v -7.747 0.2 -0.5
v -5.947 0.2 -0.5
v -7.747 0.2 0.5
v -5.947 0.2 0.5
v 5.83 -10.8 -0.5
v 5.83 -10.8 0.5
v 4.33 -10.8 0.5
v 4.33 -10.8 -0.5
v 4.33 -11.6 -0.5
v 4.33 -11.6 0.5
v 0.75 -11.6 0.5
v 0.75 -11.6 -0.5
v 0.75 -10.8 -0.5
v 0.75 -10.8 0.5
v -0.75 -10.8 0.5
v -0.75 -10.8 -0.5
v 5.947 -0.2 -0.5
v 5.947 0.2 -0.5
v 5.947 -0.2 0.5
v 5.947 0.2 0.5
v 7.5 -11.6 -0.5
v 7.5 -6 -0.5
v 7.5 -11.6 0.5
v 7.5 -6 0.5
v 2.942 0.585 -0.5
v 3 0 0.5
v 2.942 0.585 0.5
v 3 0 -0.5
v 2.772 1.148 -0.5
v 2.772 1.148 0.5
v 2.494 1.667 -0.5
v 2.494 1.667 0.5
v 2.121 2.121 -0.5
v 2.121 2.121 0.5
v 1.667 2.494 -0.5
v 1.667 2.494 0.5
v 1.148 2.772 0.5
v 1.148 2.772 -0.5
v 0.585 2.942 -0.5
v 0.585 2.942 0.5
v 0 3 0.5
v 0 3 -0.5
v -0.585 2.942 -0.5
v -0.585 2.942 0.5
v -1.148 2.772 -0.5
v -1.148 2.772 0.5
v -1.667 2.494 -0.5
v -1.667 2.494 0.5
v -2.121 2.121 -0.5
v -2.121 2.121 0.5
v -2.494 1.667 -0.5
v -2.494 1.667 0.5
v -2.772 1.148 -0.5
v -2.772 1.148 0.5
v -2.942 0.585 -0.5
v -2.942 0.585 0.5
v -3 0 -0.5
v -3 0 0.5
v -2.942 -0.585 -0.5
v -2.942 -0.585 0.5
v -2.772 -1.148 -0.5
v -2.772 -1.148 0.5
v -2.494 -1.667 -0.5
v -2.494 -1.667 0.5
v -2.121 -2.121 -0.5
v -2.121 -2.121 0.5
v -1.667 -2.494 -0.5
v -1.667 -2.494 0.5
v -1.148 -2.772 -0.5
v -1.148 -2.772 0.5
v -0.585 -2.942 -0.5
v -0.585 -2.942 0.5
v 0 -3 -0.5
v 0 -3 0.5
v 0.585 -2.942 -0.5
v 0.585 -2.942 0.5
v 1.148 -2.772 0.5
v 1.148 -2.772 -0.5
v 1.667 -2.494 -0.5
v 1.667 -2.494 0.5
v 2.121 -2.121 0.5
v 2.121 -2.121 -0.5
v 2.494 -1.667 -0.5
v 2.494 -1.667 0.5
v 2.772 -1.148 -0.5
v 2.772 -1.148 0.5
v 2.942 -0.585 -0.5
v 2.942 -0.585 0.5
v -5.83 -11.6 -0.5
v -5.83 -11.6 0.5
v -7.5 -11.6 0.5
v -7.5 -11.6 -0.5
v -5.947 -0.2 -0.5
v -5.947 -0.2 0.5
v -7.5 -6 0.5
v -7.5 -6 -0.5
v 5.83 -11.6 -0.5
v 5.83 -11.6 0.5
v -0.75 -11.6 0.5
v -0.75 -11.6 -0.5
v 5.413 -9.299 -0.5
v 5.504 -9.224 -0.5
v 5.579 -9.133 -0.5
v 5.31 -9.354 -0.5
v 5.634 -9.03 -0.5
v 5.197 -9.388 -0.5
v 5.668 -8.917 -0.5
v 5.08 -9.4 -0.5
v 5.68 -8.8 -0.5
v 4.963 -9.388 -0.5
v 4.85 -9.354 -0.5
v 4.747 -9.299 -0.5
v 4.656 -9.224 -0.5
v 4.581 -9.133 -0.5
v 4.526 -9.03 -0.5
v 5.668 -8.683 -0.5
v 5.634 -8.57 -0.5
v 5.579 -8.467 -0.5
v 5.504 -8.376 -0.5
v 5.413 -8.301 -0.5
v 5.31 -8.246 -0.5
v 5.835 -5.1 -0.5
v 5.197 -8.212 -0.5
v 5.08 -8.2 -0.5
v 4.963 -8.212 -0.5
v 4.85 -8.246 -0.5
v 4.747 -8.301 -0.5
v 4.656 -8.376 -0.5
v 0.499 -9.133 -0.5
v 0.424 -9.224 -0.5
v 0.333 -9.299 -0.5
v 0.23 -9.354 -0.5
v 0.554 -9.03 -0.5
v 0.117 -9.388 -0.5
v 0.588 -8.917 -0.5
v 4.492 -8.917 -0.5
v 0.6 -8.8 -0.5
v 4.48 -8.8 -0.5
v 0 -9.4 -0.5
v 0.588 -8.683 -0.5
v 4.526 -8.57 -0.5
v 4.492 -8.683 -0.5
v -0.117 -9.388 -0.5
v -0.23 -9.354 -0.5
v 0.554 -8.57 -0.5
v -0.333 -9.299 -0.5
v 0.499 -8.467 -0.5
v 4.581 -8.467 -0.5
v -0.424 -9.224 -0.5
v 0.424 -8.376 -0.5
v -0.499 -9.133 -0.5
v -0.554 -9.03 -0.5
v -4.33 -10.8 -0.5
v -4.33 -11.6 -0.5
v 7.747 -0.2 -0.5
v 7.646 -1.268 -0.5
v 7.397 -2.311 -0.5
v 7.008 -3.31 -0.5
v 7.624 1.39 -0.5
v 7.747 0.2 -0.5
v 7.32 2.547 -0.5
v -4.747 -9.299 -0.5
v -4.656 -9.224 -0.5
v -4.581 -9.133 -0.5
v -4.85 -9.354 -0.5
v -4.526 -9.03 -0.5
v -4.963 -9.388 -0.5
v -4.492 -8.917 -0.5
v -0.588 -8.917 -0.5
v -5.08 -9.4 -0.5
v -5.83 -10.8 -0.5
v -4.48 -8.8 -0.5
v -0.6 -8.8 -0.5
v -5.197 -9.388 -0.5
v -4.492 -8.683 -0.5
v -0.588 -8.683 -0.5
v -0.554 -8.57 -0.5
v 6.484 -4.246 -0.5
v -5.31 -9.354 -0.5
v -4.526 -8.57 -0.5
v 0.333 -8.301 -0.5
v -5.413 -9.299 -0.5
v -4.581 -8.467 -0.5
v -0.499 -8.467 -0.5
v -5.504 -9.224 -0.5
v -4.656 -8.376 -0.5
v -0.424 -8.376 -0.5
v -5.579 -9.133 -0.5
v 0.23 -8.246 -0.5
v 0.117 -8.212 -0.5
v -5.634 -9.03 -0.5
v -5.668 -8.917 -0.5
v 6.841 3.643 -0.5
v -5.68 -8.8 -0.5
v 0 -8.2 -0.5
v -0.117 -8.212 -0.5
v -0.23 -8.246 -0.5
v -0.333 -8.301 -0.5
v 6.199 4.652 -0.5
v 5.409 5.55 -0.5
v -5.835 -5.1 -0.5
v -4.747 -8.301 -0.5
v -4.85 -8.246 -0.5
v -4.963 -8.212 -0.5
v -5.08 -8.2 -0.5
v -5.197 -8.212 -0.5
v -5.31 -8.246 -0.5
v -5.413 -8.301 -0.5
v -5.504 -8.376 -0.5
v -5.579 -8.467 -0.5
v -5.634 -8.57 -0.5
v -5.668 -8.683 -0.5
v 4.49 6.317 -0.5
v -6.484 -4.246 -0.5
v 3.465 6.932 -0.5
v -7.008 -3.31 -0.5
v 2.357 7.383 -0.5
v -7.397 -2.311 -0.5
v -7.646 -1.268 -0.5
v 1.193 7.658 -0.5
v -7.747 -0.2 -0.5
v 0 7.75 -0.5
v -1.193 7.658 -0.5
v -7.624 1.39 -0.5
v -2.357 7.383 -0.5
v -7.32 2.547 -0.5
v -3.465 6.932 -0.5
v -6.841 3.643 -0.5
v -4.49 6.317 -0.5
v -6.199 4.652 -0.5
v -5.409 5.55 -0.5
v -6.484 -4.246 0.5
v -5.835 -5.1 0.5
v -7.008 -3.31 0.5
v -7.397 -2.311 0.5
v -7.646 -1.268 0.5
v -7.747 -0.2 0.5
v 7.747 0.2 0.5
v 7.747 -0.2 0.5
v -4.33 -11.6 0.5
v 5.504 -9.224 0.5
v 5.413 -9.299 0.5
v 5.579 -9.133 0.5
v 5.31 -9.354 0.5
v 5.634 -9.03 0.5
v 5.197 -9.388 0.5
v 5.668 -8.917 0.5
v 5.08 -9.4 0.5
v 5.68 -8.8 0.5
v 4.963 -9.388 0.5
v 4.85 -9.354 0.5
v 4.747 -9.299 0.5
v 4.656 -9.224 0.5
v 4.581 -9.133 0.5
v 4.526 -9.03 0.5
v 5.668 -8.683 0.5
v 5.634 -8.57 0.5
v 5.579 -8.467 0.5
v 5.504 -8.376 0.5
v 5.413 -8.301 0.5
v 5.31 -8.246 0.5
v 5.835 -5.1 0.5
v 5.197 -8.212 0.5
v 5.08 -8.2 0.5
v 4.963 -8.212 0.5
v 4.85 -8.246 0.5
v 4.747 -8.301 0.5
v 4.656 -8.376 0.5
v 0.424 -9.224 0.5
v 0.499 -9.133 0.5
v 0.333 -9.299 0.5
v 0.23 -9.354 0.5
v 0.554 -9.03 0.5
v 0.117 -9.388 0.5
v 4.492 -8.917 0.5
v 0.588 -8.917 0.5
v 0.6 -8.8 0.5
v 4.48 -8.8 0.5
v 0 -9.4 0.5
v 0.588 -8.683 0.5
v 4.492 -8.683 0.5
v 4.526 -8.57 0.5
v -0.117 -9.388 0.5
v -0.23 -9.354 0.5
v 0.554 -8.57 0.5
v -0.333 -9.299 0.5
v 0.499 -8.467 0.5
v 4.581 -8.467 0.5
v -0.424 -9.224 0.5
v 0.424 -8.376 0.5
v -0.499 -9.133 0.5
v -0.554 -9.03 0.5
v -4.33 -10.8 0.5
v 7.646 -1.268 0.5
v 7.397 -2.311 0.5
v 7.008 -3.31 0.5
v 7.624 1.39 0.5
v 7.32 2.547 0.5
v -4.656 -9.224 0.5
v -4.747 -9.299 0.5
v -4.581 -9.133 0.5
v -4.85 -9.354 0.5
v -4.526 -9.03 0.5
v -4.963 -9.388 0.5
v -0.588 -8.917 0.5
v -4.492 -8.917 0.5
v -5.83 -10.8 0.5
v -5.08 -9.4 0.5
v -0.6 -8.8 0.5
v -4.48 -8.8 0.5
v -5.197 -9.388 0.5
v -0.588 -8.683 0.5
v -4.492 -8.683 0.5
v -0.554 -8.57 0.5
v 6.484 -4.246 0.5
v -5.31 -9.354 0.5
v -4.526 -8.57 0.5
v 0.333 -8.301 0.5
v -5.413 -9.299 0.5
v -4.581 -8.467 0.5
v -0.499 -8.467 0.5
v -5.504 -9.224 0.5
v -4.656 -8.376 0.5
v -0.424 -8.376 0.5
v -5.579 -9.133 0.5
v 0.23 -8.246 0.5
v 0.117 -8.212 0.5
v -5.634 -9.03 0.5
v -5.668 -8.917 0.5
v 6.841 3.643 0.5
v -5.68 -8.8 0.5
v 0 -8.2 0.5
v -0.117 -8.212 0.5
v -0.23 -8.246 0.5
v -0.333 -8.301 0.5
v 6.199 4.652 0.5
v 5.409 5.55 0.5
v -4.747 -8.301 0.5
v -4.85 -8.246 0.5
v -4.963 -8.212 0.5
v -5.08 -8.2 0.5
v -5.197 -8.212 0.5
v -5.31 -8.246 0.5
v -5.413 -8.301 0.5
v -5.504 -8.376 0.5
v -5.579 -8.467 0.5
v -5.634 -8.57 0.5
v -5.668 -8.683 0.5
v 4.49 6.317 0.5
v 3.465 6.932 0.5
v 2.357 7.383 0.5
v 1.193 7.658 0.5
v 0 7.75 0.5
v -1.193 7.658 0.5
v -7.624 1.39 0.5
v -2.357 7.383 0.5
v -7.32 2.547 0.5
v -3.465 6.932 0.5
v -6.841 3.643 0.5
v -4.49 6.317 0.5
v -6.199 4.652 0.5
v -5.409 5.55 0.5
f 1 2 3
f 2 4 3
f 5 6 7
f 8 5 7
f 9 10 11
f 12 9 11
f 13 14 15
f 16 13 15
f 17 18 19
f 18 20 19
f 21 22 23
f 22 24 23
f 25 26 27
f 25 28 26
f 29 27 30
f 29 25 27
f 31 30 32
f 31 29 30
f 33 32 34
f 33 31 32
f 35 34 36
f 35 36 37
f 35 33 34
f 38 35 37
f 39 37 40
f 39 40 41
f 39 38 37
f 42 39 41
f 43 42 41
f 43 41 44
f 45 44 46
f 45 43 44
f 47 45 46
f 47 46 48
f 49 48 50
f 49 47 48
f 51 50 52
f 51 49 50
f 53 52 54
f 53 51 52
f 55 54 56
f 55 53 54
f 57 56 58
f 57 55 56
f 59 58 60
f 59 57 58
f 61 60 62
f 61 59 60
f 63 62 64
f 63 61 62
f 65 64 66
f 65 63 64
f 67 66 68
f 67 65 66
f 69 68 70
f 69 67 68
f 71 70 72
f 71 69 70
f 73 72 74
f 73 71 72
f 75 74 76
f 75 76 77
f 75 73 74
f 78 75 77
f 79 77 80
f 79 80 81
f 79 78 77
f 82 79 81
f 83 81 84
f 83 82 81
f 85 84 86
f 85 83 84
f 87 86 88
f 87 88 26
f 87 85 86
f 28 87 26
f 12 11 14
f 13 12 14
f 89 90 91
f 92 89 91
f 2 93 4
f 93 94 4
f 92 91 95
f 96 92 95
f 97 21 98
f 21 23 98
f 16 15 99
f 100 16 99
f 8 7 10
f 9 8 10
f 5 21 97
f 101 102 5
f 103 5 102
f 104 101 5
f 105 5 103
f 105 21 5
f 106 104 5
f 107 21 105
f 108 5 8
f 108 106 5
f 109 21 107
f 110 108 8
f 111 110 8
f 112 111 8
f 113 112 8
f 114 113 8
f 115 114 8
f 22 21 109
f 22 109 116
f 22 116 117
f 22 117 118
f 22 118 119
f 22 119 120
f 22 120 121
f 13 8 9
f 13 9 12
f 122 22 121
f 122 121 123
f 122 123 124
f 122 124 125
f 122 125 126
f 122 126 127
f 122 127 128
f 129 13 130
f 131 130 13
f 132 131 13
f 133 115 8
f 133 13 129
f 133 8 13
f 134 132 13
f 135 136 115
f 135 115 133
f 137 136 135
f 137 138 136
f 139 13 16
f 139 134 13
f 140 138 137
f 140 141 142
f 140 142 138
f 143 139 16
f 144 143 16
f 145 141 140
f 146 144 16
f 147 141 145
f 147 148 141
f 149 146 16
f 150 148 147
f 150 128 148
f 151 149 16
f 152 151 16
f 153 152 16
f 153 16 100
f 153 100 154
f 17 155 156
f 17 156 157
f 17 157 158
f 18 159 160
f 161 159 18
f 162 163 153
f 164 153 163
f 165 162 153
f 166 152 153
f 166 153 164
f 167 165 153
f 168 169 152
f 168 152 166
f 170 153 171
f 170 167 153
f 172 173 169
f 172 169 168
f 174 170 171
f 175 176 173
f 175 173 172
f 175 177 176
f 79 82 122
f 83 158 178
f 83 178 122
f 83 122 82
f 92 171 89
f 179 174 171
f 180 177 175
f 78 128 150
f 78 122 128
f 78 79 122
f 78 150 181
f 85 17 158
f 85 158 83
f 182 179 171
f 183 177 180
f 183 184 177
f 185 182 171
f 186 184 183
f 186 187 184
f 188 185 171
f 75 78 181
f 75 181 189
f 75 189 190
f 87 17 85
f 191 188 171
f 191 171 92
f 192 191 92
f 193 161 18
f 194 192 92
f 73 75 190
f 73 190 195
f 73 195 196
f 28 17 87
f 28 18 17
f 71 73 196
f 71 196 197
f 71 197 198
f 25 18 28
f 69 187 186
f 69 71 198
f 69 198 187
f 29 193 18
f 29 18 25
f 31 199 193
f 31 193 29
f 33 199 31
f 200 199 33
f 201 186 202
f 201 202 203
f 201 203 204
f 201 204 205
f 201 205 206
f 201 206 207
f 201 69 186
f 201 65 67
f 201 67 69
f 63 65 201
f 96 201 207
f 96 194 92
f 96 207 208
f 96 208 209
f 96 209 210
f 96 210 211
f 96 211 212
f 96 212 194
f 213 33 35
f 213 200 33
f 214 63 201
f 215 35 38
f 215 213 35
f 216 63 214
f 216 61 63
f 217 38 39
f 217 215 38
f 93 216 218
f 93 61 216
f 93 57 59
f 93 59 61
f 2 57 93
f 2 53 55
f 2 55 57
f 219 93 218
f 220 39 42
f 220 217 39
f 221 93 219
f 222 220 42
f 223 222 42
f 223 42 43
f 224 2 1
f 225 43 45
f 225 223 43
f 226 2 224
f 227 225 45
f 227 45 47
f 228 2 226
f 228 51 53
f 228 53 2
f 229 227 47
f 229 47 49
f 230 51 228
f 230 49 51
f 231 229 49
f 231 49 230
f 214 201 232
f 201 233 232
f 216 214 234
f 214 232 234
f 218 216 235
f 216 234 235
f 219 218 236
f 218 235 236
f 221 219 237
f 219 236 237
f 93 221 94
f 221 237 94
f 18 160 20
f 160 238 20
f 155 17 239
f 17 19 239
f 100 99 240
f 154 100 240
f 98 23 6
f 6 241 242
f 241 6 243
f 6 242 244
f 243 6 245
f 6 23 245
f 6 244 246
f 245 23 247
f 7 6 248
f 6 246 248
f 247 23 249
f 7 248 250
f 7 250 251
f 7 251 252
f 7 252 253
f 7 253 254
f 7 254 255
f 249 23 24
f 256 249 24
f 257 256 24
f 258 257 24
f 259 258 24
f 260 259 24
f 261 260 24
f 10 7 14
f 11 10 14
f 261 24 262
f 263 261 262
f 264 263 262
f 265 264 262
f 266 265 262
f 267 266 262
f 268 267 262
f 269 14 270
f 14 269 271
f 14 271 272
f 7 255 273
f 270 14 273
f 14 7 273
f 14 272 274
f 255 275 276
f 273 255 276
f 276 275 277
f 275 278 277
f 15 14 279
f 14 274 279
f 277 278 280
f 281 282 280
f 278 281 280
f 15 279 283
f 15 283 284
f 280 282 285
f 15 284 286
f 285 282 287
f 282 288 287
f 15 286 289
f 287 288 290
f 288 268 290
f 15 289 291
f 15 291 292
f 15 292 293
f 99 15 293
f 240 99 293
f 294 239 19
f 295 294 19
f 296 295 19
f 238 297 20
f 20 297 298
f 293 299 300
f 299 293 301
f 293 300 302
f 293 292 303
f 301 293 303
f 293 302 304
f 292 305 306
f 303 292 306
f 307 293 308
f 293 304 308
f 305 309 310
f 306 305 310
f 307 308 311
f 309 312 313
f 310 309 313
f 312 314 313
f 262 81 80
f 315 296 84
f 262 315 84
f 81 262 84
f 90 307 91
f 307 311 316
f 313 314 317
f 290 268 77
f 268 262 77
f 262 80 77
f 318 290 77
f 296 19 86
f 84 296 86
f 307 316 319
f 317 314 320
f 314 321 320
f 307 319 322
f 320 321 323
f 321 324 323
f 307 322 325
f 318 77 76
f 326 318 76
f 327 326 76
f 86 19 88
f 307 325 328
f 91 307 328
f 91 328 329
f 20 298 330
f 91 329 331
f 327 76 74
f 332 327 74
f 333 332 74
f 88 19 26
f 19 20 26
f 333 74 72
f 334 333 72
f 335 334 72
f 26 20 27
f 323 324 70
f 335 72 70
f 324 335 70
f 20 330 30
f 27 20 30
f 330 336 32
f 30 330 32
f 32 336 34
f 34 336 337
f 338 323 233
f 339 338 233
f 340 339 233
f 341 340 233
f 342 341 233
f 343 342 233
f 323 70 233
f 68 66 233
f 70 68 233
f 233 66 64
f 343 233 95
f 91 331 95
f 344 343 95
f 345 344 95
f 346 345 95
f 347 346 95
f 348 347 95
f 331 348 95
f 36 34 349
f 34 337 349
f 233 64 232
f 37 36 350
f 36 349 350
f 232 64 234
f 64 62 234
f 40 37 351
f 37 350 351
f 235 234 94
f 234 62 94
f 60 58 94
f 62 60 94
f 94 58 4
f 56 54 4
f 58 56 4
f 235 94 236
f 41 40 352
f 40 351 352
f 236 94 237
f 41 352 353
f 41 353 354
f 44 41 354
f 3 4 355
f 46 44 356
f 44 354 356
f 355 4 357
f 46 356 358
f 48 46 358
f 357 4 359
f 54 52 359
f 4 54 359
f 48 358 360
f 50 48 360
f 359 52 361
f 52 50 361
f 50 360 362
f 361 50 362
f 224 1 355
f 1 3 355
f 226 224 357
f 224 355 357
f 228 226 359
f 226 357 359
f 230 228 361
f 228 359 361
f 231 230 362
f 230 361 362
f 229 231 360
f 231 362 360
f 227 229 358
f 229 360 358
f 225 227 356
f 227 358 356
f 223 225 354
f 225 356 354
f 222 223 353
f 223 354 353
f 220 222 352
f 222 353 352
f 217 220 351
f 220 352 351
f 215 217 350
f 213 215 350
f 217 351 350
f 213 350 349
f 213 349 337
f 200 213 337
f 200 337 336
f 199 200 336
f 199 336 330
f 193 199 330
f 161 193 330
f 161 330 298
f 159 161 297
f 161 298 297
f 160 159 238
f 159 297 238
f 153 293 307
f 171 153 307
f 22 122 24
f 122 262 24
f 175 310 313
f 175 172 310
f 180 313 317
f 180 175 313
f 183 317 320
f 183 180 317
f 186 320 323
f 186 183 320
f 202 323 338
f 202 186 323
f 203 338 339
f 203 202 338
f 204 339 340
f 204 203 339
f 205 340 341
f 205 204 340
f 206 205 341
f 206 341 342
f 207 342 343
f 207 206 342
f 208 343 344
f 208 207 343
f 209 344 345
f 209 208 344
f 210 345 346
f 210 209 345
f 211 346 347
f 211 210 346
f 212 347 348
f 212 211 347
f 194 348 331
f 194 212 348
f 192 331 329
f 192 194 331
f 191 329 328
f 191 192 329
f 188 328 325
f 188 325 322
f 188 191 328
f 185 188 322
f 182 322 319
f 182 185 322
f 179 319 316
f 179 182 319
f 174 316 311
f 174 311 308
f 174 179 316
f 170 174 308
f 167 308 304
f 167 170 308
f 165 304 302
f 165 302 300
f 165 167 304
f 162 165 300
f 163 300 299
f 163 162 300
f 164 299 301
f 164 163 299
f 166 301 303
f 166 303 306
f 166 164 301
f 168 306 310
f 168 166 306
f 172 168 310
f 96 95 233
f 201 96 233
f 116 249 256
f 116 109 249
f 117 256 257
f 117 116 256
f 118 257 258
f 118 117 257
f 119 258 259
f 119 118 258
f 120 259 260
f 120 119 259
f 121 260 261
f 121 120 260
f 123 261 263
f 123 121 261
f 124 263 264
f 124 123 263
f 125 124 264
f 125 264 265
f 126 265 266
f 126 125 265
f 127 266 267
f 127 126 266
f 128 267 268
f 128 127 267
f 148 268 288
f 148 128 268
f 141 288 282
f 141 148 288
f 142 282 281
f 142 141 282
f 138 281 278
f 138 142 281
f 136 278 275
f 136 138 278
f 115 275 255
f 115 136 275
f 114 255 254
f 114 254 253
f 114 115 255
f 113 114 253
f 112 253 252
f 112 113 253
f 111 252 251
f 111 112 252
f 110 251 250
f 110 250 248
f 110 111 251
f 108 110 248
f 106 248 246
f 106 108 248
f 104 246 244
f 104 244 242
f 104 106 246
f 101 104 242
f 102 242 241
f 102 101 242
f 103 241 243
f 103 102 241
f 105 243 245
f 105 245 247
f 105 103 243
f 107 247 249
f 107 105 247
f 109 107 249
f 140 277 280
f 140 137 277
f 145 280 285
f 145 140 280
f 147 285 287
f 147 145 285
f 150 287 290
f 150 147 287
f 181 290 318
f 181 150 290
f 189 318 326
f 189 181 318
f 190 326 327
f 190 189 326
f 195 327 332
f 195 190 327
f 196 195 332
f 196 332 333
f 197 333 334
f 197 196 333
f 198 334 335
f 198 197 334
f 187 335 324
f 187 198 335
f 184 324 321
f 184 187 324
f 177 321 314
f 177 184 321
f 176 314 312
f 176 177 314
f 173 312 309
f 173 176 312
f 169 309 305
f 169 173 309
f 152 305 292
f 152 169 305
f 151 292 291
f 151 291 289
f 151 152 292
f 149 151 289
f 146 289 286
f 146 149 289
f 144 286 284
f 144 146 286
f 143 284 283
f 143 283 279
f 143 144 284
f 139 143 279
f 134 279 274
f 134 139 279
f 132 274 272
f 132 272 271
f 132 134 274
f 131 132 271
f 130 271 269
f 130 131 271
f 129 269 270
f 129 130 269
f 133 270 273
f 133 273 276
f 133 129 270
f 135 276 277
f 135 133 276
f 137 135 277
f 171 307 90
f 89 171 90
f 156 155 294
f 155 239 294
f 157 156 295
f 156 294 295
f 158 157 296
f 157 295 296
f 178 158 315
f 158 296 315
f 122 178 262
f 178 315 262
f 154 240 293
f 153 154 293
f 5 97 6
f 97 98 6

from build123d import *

# Parameters (mm, degrees)
SKETCH1_R           = 0.6
SKETCH1_R_2         = 3
BOSS_EXTRUDE1_DEPTH = 0.5


with BuildPart() as part:
    # Sketch1 → Boss-Extrude1 (new, symmetric)
    with BuildSketch(Plane.XY):
        with BuildLine():
            Line((-7.5, -6), (-5.835451996, -5.1))
            ThreePointArc((-5.835451996, -5.1), (-7.219840415, -2.81716247), (-7.747418925, -0.2))
            Line((-7.747418925, -0.2), (-5.947418925, -0.2))
            Line((-5.947418925, -0.2), (-5.947418925, 0))
            Line((-5.947418925, 0), (-5.947418925, 0.2))
            Line((-5.947418925, 0.2), (-7.747418925, 0.2))
            ThreePointArc((-7.747418925, 0.2), (0, 7.75), (7.747418925, 0.2))
            Line((7.747418925, 0.2), (5.947418925, 0.2))
            Line((5.947418925, 0.2), (5.947418925, 0))
            Line((5.947418925, 0), (5.947418925, -0.2))
            Line((5.947418925, -0.2), (7.747418925, -0.2))
            ThreePointArc((7.747418925, -0.2), (7.219840415, -2.81716247), (5.835451996, -5.1))
            Line((5.835451996, -5.1), (7.5, -6))
            Line((7.5, -6), (7.5, -11.6))
            Line((7.5, -11.6), (5.83, -11.6))
            Line((5.83, -11.6), (5.83, -10.8))
            Line((5.83, -10.8), (4.33, -10.8))
            Line((4.33, -10.8), (4.33, -11.6))
            Line((4.33, -11.6), (0.75, -11.6))
            Line((0.75, -11.6), (0.75, -10.8))
            Line((0.75, -10.8), (-0.75, -10.8))
            Line((-0.75, -10.8), (-0.75, -11.6))
            Line((-0.75, -11.6), (-4.33, -11.6))
            Line((-4.33, -11.6), (-4.33, -10.8))
            Line((-4.33, -10.8), (-5.83, -10.8))
            Line((-5.83, -10.8), (-5.83, -11.6))
            Line((-5.83, -11.6), (-7.5, -11.6))
            Line((-7.5, -11.6), (-7.5, -6))
        make_face()
        with Locations((-5.08, -8.8)):
            Circle(SKETCH1_R, mode=Mode.SUBTRACT)
        with Locations((0, -8.8)):
            Circle(SKETCH1_R, mode=Mode.SUBTRACT)
        with Locations((5.08, -8.8)):
            Circle(SKETCH1_R, mode=Mode.SUBTRACT)
        Circle(SKETCH1_R_2, mode=Mode.SUBTRACT)
    extrude(amount=BOSS_EXTRUDE1_DEPTH, both=True)


solid = part.part
